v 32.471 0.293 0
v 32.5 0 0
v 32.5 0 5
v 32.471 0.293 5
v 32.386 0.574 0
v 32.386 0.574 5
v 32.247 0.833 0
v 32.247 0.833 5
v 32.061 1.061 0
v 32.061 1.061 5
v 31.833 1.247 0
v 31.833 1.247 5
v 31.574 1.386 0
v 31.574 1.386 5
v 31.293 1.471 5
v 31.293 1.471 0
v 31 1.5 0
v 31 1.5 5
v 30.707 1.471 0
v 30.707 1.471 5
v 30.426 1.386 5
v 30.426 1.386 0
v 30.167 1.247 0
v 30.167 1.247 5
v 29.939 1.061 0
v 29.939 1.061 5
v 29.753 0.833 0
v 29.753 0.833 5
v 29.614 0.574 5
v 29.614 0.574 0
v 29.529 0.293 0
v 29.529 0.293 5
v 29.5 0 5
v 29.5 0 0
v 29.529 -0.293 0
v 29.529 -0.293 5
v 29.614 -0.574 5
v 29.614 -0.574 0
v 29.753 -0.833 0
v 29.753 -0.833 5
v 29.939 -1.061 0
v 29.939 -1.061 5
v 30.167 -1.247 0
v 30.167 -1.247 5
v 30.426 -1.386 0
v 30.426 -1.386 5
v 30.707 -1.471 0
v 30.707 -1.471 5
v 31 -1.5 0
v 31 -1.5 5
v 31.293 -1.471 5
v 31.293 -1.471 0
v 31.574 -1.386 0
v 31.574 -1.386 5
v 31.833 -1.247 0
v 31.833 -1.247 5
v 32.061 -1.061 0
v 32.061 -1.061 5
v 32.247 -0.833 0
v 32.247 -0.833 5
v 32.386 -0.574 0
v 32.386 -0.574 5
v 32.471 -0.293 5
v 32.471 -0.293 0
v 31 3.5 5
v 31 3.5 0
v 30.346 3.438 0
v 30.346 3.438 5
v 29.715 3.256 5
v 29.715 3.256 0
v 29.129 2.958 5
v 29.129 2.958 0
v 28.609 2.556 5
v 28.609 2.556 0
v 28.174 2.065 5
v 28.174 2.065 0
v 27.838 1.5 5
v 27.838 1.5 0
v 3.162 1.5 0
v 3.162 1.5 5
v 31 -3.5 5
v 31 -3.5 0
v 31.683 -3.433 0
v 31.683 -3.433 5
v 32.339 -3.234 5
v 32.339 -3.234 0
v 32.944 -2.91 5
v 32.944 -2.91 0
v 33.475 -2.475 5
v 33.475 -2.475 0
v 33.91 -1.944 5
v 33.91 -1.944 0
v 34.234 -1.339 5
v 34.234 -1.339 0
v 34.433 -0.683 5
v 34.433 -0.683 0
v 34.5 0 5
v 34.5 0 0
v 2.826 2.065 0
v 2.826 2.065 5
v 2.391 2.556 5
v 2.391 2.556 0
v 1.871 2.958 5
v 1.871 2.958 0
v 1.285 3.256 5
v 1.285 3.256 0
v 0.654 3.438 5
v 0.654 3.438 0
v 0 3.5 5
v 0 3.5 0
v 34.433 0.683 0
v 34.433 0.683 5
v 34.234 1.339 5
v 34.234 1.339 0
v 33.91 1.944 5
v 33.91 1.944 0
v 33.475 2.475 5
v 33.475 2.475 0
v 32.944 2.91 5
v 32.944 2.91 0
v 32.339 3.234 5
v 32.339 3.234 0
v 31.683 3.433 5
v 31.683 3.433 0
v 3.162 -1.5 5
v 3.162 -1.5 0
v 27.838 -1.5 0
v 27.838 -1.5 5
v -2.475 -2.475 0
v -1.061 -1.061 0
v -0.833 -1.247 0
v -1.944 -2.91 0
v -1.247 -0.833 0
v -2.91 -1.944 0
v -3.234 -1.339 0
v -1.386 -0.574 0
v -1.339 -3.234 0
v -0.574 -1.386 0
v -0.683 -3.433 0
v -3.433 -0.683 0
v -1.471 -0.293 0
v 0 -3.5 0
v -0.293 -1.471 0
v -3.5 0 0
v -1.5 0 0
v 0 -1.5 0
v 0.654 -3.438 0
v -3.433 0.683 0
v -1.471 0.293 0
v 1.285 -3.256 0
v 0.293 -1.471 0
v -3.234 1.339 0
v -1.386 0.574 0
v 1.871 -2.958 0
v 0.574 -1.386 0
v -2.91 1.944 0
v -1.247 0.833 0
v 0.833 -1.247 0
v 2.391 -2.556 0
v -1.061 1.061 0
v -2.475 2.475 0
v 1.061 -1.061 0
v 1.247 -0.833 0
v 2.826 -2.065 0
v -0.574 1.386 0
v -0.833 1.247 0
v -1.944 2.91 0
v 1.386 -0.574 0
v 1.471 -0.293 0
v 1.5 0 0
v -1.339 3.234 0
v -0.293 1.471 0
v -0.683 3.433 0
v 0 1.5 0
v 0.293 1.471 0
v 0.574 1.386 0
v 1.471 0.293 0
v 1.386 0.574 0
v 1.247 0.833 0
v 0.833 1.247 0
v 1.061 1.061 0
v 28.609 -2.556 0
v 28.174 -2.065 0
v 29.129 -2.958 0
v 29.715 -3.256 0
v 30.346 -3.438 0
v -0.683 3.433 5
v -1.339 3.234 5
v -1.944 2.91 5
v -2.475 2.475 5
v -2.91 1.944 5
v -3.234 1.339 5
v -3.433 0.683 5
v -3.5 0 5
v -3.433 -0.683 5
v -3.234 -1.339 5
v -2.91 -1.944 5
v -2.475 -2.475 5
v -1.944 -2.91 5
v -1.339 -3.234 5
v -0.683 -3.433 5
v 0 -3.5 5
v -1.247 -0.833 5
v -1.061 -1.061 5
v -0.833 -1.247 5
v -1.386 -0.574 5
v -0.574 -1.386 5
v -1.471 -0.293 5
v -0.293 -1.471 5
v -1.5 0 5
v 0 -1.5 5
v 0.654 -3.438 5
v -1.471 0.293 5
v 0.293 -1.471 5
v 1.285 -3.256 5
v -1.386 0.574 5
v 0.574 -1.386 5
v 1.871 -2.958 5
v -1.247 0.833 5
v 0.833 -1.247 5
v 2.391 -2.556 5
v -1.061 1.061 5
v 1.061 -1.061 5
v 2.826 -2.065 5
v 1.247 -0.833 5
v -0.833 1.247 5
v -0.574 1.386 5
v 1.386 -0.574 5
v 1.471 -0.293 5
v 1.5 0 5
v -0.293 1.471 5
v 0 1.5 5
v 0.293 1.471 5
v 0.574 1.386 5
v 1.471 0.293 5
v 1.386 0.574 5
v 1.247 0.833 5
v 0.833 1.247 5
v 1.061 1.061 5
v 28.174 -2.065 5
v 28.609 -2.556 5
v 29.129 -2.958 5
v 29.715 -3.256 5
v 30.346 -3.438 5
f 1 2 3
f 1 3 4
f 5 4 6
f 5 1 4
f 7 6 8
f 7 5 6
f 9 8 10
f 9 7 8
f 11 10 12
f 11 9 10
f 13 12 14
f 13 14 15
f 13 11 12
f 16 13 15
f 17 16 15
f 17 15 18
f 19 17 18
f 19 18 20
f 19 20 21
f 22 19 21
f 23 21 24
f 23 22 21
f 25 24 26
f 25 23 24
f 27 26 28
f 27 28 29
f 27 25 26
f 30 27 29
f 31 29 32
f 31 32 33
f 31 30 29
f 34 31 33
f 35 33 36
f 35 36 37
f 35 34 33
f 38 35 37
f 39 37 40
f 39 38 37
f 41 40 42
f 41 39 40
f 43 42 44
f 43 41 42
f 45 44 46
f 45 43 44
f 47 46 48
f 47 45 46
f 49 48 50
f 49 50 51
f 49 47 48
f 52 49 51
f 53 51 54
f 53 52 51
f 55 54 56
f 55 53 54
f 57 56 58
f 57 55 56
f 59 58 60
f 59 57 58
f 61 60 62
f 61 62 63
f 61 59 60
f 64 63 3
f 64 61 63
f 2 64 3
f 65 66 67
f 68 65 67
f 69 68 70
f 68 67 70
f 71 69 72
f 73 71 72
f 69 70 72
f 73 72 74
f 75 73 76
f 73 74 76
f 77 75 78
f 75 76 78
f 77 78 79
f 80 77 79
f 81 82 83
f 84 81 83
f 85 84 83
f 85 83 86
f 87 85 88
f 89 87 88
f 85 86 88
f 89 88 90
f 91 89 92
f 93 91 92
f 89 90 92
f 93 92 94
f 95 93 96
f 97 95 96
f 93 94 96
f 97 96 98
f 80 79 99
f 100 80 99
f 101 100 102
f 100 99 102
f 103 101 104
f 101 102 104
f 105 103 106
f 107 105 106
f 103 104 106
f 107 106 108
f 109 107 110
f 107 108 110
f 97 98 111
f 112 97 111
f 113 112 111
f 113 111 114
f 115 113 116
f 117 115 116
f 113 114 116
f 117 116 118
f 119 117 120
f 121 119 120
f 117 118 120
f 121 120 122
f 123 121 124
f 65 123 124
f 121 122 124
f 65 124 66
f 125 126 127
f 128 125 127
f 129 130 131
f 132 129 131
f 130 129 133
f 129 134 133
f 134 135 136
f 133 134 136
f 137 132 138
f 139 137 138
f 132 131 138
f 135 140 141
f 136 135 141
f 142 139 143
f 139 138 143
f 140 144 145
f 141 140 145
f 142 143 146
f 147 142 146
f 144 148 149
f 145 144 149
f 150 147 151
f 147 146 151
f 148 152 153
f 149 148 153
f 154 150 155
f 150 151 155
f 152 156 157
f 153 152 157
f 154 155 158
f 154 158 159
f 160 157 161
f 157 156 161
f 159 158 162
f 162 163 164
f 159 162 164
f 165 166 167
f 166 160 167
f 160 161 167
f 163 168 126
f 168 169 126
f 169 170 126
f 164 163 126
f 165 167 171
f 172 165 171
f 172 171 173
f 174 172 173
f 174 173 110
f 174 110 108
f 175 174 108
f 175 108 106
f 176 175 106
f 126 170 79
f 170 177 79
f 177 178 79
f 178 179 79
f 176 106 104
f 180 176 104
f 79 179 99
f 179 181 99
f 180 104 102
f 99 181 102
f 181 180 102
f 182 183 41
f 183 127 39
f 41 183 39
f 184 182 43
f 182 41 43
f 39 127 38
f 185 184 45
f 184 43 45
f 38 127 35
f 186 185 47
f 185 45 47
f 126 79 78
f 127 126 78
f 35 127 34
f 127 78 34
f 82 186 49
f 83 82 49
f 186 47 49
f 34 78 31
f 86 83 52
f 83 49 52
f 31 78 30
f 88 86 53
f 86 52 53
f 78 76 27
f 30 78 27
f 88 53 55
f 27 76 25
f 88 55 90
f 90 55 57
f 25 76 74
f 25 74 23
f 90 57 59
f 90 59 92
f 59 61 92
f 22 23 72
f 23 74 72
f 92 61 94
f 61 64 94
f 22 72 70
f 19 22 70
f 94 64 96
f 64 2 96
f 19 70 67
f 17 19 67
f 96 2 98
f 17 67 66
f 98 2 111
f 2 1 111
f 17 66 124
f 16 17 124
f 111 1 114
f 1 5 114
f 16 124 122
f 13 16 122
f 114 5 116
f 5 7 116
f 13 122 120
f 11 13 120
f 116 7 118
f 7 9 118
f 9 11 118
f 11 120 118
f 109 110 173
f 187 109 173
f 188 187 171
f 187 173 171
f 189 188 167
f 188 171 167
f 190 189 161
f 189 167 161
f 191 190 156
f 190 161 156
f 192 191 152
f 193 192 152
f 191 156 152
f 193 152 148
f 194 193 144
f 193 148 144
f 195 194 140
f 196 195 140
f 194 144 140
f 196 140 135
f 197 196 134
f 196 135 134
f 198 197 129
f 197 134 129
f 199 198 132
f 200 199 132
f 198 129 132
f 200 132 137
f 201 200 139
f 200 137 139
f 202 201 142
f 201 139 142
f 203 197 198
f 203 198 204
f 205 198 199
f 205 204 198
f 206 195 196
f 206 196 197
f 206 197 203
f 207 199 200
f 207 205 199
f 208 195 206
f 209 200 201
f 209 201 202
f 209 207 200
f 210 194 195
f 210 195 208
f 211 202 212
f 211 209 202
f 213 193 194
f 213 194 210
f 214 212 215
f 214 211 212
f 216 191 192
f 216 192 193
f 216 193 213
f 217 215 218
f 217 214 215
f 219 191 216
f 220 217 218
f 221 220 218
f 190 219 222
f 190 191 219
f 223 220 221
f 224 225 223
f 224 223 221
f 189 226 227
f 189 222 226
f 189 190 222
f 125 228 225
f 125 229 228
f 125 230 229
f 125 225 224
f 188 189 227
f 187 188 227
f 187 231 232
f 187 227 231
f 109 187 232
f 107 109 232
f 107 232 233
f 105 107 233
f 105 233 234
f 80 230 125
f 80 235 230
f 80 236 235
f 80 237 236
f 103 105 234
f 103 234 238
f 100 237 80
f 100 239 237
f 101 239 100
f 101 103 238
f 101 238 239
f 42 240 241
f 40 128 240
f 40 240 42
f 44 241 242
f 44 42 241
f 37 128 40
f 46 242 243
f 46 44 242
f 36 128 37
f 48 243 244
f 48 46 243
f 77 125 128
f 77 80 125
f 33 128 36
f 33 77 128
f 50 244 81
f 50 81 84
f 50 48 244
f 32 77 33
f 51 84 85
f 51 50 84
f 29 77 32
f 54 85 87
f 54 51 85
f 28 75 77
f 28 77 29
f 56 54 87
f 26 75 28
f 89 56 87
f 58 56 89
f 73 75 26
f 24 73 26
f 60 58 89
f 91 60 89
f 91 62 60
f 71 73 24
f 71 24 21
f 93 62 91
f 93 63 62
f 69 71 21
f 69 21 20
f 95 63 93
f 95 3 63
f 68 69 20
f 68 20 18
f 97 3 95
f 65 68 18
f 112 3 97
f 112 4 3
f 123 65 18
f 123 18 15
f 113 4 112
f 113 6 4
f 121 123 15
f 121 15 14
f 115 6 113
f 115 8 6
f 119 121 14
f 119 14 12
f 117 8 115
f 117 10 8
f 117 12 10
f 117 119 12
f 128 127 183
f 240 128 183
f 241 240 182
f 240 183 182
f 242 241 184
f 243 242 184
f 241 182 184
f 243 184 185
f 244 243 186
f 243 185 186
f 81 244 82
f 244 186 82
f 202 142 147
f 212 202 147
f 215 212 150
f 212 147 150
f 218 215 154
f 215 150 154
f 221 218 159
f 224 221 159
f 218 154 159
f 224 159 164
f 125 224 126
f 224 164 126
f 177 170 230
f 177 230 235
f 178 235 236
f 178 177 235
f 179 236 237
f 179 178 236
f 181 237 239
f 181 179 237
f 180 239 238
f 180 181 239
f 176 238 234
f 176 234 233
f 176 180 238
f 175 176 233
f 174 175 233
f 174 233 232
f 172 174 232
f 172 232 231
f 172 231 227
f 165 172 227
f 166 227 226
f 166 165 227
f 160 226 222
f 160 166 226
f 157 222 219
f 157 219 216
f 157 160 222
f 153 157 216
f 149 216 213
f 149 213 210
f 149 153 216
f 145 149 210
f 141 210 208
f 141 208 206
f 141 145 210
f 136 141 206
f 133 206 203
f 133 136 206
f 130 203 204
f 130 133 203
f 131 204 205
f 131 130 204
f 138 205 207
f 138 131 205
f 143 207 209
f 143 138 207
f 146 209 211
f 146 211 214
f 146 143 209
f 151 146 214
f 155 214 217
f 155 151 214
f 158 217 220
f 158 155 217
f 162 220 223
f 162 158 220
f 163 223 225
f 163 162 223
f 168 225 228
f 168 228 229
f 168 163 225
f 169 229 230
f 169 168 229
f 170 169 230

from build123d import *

# Parameters (mm, degrees)
SKETCH_1_R      = 1.5
EXTRUDE_1_DEPTH = 5


with BuildPart() as part:
    # 스케치1 → 보스-돌출1 (new body)
    # profile 1 of 5: a face of its own
    with BuildSketch(Plane.XY):
        with BuildLine():
            Line((27.83772234, 1.5), (3.16227766, 1.5))
            ThreePointArc((3.16227766, 1.5), (3.414525722, 0.768774411), (3.5, 0))
            ThreePointArc((3.5, 0), (3.414525722, -0.768774411), (3.16227766, -1.5))
            Line((3.16227766, -1.5), (27.83772234, -1.5))
            ThreePointArc((27.83772234, -1.5), (27.5, 0), (27.83772234, 1.5))
        make_face()
    # profile 2 of 5: a face of its own
    with BuildSketch(Plane.XY):
        with BuildLine():
            ThreePointArc((3.16227766, 1.5), (1.870828693, 2.958039892), (0, 3.5))
            ThreePointArc((0, 3.5), (-3.5, 0), (0, -3.5))
            ThreePointArc((0, -3.5), (1.870828693, -2.958039892), (3.16227766, -1.5))
            Line((3.16227766, -1.5), (3.16227766, 1.5))
        make_face()
        Circle(SKETCH_1_R, mode=Mode.SUBTRACT)
    # profile 3 of 5: a face of its own
    with BuildSketch(Plane.XY):
        with BuildLine():
            ThreePointArc((34.5, 0), (33.474873734, 2.474873734), (31, 3.5))
            ThreePointArc((31, 3.5), (29.129171307, 2.958039892), (27.83772234, 1.5))
            Line((27.83772234, 1.5), (27.83772234, -1.5))
            ThreePointArc((27.83772234, -1.5), (29.129171307, -2.958039892), (31, -3.5))
            ThreePointArc((31, -3.5), (33.474873734, -2.474873734), (34.5, 0))
        make_face()
        with Locations((31, 0)):
            Circle(SKETCH_1_R, mode=Mode.SUBTRACT)
    # profile 4 of 5: a face of its own
    with BuildSketch(Plane.XY):
        with BuildLine():
            ThreePointArc((3.5, 0), (3.414525722, 0.768774411), (3.16227766, 1.5))
            Line((3.16227766, 1.5), (3.16227766, -1.5))
            ThreePointArc((3.16227766, -1.5), (3.414525722, -0.768774411), (3.5, 0))
        make_face()
    # profile 5 of 5: a face of its own
    with BuildSketch(Plane.XY):
        with BuildLine():
            Line((27.83772234, -1.5), (27.83772234, 1.5))
            ThreePointArc((27.83772234, 1.5), (27.5, 0), (27.83772234, -1.5))
        make_face()
    extrude(amount=EXTRUDE_1_DEPTH)


solid = part.part
